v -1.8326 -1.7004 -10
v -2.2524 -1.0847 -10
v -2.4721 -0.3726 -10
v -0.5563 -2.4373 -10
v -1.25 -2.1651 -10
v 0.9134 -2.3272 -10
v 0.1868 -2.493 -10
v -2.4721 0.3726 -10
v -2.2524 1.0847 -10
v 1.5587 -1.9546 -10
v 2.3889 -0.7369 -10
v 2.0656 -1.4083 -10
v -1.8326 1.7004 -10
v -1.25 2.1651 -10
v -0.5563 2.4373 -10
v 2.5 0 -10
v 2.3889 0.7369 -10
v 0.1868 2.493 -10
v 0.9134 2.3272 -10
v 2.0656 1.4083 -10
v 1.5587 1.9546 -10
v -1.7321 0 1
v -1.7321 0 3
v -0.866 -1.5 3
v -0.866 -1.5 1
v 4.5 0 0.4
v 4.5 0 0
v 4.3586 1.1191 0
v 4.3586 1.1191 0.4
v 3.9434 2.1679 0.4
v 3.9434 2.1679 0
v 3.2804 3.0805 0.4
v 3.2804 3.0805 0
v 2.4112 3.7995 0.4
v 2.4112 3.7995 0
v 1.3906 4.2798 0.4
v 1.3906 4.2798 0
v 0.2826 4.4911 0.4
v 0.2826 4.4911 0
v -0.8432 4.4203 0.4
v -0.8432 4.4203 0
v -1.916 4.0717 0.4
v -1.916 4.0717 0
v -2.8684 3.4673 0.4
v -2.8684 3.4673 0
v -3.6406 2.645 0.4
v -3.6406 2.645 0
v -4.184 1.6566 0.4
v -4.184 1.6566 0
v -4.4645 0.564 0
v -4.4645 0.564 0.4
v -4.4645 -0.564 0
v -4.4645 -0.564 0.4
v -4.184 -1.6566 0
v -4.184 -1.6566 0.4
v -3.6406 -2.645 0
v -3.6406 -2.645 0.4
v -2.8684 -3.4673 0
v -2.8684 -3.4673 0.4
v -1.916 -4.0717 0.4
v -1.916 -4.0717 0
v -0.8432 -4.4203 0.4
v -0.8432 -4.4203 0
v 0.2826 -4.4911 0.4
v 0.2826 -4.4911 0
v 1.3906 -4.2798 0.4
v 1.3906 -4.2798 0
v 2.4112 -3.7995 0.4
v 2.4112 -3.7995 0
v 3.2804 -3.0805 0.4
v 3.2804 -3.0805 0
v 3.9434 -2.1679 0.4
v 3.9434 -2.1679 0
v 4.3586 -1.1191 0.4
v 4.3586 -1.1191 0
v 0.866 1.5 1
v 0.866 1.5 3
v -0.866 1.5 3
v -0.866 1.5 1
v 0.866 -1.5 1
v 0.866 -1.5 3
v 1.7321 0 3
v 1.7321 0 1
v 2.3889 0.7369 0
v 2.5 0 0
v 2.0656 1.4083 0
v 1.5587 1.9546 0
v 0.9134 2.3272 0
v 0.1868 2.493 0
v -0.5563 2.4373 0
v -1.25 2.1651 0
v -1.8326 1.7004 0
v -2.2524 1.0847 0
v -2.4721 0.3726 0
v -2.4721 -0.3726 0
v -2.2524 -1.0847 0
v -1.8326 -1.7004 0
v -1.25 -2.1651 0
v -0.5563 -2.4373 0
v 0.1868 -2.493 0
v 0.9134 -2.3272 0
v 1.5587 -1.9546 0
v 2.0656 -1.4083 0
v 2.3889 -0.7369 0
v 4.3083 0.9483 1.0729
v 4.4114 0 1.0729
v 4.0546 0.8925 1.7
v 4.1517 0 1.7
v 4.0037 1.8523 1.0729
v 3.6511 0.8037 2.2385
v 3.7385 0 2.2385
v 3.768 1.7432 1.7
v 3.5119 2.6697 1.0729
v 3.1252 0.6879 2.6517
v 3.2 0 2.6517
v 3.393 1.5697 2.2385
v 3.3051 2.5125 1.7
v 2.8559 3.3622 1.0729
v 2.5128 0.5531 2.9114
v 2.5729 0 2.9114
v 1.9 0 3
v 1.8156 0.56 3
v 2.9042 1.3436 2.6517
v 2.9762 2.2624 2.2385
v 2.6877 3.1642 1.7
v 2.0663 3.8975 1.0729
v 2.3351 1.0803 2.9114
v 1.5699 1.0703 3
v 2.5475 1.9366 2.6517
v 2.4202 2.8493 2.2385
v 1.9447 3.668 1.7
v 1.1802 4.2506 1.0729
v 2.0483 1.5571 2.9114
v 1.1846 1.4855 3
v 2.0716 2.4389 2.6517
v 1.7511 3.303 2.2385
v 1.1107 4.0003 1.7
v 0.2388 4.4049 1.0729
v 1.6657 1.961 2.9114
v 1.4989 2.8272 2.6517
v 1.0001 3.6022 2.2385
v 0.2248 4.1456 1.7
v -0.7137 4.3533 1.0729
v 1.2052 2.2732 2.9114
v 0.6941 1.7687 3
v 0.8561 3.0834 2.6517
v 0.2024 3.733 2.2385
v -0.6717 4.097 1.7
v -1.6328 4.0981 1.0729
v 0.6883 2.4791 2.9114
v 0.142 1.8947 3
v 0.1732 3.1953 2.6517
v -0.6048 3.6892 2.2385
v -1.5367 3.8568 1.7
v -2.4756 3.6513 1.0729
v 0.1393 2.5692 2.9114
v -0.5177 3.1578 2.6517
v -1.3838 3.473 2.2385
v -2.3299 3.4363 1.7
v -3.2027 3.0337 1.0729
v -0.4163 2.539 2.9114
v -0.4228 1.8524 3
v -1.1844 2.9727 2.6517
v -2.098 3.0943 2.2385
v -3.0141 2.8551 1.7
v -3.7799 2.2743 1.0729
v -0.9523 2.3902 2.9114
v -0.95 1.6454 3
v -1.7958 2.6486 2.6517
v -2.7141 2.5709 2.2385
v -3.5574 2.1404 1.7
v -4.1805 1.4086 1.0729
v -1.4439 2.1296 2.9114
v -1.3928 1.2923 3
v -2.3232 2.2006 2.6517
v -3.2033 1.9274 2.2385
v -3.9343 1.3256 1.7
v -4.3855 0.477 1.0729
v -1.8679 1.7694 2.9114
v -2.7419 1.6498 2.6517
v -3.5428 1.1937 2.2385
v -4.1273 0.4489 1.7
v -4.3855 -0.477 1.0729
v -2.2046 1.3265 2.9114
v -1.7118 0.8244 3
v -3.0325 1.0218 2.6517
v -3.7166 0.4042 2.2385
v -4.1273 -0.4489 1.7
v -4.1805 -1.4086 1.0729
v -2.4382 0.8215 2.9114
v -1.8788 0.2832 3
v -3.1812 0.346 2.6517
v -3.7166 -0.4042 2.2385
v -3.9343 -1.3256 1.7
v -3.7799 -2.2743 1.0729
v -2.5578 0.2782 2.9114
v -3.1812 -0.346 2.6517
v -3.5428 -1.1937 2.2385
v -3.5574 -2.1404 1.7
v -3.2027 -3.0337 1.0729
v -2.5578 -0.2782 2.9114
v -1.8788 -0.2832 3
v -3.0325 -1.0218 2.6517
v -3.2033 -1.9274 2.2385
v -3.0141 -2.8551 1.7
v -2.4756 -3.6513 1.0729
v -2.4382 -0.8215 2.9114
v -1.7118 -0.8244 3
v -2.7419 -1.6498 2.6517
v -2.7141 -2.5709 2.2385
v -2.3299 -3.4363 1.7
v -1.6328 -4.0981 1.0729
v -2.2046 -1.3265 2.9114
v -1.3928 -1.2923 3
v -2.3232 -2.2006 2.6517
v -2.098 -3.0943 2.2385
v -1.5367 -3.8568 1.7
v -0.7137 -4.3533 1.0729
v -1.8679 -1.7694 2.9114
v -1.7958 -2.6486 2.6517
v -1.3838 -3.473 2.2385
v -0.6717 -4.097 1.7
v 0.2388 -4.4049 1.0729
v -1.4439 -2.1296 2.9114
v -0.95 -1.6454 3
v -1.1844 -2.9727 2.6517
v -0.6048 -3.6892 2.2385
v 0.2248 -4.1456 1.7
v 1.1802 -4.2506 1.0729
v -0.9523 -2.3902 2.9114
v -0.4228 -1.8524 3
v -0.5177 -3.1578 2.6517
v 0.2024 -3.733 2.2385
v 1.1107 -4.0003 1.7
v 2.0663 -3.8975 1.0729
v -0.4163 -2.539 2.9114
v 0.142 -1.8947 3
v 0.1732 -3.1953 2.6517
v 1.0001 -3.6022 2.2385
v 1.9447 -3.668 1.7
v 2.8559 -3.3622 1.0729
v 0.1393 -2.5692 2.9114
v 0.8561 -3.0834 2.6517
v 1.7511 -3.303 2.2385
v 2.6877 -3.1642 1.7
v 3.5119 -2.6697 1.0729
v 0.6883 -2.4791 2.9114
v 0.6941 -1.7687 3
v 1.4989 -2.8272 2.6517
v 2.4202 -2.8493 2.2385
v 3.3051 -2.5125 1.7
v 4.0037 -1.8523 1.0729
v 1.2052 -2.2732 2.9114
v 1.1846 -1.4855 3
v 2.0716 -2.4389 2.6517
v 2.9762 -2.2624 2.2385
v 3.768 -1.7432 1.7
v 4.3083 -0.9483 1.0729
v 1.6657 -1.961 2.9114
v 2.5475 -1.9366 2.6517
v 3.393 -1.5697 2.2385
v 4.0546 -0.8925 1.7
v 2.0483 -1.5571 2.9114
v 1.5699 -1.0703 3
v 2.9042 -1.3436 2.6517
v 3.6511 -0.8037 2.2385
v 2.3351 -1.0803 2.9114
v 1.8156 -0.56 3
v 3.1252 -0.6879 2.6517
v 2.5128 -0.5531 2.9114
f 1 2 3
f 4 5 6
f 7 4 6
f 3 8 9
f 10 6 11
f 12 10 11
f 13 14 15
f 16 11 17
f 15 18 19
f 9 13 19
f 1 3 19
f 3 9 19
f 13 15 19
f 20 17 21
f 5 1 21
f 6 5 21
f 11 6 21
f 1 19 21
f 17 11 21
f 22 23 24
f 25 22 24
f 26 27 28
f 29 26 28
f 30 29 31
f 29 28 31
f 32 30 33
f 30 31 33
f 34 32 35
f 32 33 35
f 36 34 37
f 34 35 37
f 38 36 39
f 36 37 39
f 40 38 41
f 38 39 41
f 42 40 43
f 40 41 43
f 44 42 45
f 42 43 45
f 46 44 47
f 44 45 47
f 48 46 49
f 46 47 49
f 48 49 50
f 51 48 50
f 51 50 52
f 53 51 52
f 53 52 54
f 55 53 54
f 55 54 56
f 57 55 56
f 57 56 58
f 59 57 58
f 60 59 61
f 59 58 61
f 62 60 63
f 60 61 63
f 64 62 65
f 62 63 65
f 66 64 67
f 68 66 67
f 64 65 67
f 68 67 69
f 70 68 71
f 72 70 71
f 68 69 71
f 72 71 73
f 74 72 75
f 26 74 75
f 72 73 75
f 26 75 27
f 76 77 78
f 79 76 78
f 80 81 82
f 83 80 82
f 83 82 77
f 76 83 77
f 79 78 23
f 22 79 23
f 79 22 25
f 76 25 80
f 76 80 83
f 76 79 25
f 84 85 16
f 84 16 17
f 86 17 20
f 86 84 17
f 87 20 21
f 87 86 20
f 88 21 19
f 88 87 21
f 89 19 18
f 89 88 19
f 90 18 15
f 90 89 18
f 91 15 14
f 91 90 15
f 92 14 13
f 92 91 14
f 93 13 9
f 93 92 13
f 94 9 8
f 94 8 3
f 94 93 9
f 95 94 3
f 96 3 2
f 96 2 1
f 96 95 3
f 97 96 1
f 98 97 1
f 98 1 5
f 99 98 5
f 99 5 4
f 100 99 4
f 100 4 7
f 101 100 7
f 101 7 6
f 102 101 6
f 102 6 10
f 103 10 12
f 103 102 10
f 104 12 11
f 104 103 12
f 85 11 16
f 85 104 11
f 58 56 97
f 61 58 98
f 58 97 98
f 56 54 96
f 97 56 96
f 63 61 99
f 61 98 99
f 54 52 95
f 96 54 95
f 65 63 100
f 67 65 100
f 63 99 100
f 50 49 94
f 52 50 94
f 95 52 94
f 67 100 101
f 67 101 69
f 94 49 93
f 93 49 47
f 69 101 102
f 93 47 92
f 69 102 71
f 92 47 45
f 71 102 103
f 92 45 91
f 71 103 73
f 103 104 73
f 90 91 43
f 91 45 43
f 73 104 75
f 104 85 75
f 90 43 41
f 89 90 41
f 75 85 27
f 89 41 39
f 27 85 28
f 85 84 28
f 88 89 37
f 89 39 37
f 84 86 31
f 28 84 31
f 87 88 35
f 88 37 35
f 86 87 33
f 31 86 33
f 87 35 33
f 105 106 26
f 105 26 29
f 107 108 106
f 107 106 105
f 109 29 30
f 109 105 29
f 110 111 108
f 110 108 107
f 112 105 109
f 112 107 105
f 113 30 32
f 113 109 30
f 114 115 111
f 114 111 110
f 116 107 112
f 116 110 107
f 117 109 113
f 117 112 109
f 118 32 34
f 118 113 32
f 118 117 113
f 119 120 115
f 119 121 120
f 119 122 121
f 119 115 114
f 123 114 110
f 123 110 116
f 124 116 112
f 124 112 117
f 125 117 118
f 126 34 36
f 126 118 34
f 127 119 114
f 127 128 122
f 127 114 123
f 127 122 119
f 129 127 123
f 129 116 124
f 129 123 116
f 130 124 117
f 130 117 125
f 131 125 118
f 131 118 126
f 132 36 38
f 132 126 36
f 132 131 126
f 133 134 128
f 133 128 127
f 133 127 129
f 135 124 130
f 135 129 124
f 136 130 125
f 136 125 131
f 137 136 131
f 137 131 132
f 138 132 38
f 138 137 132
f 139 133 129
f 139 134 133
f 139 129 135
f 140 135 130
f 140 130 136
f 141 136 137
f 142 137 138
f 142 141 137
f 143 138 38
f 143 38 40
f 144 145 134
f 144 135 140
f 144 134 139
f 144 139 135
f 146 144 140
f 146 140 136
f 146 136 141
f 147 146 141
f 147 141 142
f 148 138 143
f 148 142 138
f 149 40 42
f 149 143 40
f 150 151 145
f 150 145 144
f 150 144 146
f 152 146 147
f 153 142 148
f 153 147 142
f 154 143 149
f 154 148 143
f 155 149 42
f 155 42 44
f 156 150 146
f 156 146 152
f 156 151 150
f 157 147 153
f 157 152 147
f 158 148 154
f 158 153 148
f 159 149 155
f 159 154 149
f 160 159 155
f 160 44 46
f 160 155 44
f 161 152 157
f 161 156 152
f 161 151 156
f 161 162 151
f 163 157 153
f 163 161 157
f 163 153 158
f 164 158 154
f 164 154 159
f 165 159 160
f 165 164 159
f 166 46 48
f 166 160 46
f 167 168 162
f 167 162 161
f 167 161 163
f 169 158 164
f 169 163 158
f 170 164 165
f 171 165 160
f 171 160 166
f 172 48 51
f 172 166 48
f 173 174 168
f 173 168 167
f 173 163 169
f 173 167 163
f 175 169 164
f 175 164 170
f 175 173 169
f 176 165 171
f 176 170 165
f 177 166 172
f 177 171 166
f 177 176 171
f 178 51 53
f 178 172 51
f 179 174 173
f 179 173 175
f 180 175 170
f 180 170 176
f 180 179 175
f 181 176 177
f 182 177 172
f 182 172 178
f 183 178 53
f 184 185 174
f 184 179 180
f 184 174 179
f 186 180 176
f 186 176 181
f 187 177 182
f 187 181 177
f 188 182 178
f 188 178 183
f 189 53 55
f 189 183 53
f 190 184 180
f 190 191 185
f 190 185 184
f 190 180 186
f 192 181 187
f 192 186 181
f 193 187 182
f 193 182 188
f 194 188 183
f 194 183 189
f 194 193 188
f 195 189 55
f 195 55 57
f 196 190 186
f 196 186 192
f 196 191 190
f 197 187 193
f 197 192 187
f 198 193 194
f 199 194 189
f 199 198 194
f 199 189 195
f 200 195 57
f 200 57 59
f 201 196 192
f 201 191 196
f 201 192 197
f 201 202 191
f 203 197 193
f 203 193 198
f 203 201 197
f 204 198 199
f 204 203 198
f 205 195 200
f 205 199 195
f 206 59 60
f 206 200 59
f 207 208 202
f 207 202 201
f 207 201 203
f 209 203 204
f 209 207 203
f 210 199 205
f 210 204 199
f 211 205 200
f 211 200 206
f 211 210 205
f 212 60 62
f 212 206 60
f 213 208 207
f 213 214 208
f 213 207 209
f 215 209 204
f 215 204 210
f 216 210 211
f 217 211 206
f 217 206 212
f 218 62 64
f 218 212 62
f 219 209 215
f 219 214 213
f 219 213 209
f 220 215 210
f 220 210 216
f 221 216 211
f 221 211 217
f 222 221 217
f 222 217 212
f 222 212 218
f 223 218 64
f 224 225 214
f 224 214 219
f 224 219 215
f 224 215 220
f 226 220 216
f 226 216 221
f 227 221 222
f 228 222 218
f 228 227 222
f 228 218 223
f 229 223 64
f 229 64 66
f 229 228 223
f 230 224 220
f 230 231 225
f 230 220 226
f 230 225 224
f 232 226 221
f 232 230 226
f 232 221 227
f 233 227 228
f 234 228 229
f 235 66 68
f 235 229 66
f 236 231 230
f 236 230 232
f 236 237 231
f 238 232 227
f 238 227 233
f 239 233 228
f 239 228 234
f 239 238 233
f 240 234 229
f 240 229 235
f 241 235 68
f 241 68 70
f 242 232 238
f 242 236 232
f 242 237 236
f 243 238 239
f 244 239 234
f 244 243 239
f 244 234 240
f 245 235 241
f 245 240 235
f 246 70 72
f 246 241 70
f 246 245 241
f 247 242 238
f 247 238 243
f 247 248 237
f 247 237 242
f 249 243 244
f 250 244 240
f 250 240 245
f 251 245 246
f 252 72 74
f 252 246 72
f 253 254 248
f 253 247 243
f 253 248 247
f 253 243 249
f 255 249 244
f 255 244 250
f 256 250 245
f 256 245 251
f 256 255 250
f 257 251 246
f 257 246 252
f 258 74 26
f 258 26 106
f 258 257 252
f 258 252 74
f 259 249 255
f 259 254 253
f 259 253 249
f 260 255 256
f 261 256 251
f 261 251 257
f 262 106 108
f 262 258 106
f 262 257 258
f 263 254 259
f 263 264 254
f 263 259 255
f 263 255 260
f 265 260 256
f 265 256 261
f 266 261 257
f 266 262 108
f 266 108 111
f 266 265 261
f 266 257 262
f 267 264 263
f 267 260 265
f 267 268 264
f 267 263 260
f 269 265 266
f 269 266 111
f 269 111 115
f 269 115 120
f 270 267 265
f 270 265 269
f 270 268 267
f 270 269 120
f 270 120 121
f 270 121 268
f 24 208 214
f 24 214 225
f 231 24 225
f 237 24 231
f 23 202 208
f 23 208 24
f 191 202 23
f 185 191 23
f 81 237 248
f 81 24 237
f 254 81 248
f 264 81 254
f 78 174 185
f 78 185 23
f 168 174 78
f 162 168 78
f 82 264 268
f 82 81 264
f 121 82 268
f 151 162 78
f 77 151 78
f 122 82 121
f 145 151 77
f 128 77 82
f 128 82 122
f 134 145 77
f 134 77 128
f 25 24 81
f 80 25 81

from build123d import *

# Parameters (mm, degrees)
F0_R     = 2.5
F1_DEPTH = 10
F0_R_2   = 4.5
F2_DEPTH = 3
F3_R     = 2.6
F5_DEPTH = 2


with BuildPart() as f1:
    # F0 (on Top) → F1 (new body)
    with BuildSketch(Plane.XY):
        Circle(F0_R)
    extrude(amount=-F1_DEPTH)

    # F0 (on Top) → F2 (join)
    with BuildSketch(Plane.XY):
        Circle(F0_R_2)
        Circle(F0_R, mode=Mode.SUBTRACT)
        Circle(F0_R)
    extrude(amount=F2_DEPTH)

    # F3
    f3_edges = [f1.edges().sort_by_distance(p)[0] for p in [
        (-4.5, 0, 3),
    ]]
    fillet(f3_edges, radius=F3_R)

    # F4 (on face) → F5 (cut)
    with BuildSketch(Plane.XY.offset(3)):
        Polygon((-0.866025, -1.5), (0.866025, -1.5), (1.732051, 0), (0.866025, 1.5), (-0.866025, 1.5), (-1.732051, 0), align=None)
    extrude(amount=-F5_DEPTH, mode=Mode.SUBTRACT)


solid = f1.part
